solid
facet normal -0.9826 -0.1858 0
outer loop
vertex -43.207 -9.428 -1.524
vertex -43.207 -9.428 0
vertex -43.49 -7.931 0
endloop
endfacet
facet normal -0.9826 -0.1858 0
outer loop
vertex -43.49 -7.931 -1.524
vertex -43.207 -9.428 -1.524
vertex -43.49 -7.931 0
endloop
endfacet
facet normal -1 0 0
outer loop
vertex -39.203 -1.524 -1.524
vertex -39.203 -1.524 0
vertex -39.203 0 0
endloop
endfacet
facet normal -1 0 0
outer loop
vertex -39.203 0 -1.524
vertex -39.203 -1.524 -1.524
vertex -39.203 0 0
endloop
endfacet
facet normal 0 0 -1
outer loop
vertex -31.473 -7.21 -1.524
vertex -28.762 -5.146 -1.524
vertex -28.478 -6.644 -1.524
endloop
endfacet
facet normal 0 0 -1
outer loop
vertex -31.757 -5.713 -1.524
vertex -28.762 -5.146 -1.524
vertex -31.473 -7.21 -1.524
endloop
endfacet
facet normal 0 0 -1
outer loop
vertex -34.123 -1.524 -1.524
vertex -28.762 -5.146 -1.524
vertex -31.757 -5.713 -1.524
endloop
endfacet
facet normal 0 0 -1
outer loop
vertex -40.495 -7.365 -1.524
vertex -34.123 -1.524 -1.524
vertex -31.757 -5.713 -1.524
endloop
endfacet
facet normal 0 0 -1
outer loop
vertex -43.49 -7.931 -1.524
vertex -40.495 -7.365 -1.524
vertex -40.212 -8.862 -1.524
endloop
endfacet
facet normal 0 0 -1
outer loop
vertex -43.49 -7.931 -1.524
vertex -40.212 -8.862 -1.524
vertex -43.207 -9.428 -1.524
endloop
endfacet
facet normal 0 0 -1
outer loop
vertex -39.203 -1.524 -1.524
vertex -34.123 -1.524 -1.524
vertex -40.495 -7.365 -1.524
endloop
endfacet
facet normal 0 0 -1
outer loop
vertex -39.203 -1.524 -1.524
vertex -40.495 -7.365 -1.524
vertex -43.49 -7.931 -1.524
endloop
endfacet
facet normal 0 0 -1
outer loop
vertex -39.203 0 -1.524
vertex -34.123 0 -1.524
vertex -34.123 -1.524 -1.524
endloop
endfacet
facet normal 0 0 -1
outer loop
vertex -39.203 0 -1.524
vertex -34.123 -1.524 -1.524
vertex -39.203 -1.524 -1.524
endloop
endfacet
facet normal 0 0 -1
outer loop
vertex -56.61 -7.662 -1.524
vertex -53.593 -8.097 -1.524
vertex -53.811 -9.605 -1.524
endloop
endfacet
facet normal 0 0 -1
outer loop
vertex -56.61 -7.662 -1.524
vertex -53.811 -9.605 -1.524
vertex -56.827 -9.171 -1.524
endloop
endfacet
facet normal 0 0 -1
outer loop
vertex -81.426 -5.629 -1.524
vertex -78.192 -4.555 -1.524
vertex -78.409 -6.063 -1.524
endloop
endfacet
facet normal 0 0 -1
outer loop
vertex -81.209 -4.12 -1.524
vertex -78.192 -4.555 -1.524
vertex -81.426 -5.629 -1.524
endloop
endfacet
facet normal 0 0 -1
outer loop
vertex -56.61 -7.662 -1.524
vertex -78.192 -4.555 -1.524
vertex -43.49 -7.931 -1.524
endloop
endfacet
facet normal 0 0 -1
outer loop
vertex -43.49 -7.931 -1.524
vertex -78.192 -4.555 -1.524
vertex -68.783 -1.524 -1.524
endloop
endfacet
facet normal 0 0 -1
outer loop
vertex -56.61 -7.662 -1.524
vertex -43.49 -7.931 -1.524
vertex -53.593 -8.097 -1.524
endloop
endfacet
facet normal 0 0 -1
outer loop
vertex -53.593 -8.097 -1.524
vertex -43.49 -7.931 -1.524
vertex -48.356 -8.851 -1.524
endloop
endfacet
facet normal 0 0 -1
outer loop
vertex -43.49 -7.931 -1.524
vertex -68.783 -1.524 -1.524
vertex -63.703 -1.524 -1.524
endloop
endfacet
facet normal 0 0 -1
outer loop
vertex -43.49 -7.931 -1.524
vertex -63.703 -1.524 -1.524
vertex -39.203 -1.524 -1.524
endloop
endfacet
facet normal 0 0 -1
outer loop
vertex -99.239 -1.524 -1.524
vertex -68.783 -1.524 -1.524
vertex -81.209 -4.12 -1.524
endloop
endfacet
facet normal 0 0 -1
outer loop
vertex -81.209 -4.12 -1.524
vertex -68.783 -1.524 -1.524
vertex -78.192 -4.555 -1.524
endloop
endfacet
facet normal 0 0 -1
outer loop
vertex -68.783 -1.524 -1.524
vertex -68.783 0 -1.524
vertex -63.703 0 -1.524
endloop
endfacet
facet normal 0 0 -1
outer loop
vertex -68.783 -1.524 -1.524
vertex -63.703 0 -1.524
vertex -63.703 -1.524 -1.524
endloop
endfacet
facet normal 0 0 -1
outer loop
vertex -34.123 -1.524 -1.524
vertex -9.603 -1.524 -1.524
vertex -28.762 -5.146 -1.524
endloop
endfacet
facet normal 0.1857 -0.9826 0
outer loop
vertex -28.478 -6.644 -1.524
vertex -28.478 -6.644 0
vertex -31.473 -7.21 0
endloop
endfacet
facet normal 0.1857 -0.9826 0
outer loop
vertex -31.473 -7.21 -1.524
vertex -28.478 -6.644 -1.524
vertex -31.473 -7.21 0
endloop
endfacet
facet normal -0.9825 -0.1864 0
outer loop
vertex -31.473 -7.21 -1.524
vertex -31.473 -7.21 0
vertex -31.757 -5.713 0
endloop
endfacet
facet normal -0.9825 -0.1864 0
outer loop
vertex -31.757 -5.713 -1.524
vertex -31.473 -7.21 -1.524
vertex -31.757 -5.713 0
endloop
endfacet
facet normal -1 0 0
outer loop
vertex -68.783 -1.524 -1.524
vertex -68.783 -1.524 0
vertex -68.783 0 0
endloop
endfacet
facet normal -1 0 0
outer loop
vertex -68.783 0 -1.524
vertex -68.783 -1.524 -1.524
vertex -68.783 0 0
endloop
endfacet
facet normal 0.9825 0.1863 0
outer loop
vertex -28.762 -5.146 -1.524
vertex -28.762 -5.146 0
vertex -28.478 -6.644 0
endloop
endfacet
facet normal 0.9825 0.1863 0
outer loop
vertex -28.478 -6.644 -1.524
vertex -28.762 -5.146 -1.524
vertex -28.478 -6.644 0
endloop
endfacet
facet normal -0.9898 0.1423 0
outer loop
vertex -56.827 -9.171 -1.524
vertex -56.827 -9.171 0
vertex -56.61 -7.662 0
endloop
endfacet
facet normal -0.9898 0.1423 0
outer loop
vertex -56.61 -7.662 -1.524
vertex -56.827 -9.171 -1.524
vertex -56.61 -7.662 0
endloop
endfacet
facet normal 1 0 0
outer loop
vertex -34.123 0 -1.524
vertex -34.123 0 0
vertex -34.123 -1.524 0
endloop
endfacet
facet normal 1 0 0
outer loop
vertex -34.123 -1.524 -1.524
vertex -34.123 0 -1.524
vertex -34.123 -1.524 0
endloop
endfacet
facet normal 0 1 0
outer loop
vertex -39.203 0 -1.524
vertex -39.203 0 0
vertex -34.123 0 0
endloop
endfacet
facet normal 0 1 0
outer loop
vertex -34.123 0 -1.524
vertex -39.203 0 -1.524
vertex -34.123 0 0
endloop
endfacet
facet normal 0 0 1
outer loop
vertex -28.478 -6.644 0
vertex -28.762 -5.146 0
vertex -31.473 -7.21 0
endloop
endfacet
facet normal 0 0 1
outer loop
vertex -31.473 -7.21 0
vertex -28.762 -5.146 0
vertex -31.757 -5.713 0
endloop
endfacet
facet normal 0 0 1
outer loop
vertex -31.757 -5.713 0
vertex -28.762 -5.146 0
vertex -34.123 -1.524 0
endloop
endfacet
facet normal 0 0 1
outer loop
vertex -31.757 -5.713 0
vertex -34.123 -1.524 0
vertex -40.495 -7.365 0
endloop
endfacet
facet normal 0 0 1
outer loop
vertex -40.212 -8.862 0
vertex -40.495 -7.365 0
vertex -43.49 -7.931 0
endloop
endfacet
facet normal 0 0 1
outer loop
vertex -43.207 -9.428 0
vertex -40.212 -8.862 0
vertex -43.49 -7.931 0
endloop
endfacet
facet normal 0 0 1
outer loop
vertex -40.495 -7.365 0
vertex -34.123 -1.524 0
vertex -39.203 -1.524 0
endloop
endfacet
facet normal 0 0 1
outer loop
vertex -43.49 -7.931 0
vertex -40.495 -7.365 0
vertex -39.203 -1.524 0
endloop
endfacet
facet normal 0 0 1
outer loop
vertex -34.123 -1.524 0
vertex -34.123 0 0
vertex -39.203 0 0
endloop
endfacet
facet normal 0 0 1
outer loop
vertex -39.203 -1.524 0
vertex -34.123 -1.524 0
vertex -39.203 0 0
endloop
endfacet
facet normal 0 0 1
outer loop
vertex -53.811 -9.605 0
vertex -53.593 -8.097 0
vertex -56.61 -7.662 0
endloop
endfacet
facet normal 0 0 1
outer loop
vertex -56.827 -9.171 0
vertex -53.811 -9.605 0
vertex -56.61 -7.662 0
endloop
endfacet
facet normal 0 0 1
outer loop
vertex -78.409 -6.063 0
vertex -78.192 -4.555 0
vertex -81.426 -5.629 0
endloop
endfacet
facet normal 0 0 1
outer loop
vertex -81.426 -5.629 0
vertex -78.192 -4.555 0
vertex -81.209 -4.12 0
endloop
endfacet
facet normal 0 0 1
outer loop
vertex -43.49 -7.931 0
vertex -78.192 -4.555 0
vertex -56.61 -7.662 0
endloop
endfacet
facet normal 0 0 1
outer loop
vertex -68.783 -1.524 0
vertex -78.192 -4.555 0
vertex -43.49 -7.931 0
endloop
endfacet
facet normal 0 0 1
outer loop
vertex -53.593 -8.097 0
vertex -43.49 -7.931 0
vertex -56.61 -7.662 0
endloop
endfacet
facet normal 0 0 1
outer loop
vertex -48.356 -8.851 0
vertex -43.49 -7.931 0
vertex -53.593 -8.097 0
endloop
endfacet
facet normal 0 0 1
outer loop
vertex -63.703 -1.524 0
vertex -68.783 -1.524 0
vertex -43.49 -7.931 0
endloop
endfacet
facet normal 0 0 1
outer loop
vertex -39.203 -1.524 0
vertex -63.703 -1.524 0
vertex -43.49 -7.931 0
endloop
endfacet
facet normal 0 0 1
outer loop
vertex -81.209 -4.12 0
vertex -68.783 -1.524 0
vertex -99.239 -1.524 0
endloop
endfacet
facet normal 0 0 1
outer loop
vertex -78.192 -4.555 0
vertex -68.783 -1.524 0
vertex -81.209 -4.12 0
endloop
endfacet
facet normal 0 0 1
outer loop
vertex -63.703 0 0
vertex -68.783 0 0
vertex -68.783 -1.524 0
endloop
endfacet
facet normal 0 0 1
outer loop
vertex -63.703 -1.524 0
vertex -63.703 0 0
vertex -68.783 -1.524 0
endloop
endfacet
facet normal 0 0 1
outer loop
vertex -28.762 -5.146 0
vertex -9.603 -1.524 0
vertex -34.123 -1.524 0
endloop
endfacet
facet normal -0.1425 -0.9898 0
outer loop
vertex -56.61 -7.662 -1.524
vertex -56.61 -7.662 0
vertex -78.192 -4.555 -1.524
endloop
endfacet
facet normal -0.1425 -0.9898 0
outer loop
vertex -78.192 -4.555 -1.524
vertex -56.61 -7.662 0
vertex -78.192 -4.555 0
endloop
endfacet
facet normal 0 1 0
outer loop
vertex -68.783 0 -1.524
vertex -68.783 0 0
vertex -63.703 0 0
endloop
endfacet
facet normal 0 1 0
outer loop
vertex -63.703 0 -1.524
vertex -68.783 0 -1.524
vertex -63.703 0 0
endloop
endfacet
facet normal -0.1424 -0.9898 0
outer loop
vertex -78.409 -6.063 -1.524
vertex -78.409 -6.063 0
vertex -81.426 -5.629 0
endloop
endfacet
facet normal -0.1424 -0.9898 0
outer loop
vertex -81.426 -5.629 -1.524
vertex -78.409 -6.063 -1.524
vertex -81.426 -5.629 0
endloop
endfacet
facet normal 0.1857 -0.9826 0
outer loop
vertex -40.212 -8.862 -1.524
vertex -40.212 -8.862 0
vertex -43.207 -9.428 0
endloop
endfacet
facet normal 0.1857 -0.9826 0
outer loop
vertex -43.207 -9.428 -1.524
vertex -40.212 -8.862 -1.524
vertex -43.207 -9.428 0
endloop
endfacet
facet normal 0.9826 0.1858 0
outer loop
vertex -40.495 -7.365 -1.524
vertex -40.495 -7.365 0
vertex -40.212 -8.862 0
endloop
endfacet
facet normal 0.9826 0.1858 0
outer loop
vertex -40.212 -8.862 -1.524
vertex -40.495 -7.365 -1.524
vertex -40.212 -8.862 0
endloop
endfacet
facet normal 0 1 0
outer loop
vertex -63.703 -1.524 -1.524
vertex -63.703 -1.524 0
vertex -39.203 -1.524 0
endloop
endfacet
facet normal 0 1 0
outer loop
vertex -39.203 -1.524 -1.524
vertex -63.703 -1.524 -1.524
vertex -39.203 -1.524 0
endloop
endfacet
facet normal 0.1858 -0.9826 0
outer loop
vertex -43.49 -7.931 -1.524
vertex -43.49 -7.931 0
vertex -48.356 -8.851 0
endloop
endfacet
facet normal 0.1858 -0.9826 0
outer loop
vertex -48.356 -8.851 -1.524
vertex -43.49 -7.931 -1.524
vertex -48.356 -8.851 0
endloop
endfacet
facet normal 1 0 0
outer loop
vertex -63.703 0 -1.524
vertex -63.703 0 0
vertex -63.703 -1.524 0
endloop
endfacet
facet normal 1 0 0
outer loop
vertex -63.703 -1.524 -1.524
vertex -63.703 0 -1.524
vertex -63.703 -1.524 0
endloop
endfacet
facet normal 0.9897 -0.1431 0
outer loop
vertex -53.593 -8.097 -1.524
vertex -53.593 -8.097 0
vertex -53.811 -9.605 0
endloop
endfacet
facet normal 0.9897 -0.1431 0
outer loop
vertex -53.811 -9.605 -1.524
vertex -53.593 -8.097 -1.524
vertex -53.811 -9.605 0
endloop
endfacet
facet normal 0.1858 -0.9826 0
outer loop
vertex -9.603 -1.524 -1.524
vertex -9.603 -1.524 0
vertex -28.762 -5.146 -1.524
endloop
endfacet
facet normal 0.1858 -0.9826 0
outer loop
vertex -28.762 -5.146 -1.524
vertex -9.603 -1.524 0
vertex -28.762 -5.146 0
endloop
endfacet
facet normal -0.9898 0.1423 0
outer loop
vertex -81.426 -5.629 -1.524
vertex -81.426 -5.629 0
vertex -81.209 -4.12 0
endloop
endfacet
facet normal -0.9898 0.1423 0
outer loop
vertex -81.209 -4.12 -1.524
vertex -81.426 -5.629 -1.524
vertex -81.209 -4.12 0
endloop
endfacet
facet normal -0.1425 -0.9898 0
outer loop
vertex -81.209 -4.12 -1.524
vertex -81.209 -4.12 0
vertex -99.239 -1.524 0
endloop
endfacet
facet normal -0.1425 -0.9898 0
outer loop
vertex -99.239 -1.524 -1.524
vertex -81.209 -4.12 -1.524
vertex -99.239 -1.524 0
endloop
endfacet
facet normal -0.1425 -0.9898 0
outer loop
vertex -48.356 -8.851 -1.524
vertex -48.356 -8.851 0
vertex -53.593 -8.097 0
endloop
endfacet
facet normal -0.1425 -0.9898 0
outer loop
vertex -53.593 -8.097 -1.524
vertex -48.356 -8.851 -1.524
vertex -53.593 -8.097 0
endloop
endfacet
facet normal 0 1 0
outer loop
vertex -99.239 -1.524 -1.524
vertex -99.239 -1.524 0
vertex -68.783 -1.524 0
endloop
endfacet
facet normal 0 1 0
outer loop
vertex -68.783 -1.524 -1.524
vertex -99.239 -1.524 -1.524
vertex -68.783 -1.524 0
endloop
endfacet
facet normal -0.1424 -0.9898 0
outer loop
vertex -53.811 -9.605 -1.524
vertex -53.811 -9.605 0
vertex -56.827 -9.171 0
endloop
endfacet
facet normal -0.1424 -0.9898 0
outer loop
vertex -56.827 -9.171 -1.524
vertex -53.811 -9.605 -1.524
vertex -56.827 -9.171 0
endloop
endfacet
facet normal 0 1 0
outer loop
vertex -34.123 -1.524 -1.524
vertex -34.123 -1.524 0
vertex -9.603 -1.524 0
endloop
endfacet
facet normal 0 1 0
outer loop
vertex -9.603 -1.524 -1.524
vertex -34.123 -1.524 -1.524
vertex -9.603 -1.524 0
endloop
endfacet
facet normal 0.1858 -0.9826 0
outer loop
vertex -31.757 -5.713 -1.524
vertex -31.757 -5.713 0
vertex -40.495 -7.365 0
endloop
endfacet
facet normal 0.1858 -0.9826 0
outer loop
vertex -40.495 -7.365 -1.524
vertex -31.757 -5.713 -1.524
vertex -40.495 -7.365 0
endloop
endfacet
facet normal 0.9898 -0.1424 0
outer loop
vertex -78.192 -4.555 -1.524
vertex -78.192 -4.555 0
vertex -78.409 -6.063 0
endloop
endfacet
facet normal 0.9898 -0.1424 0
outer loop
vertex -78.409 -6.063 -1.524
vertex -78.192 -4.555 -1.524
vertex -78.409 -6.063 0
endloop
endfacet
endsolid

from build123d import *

# Parameters (mm, degrees)
BOSS_EXTRUDE1_DEPTH = 1.524


with BuildPart() as part:
    # Sketch1 → Boss-Extrude1 (new body)
    with BuildSketch(Plane.XY):
        Polygon((-9.60258928, -1.524), (-28.761615364, -5.146272329), (-28.478498191, -6.643743753), (-31.47344104, -7.209978099), (-31.756558213, -5.712506675), (-40.495294208, -7.364682597), (-40.212177035, -8.862154021), (-43.207119883, -9.428388367), (-43.490237056, -7.930916943), (-48.355985293, -8.850852284), (-53.593355447, -8.096704042), (-53.810561584, -9.605146117), (-56.827445734, -9.170733844), (-56.610239597, -7.662291769), (-78.191926721, -4.554665056), (-78.409132858, -6.063107132), (-81.426017008, -5.628694858), (-81.208810872, -4.120252783), (-99.239134473, -1.524), (-68.783094529, -1.524), (-68.783094529, 0), (-63.703094529, 0), (-63.703094529, -1.524), (-39.202780194, -1.524), (-39.202780194, 0), (-34.122780194, 0), (-34.122780194, -1.524), align=None)
    extrude(amount=-BOSS_EXTRUDE1_DEPTH)


solid = part.part
